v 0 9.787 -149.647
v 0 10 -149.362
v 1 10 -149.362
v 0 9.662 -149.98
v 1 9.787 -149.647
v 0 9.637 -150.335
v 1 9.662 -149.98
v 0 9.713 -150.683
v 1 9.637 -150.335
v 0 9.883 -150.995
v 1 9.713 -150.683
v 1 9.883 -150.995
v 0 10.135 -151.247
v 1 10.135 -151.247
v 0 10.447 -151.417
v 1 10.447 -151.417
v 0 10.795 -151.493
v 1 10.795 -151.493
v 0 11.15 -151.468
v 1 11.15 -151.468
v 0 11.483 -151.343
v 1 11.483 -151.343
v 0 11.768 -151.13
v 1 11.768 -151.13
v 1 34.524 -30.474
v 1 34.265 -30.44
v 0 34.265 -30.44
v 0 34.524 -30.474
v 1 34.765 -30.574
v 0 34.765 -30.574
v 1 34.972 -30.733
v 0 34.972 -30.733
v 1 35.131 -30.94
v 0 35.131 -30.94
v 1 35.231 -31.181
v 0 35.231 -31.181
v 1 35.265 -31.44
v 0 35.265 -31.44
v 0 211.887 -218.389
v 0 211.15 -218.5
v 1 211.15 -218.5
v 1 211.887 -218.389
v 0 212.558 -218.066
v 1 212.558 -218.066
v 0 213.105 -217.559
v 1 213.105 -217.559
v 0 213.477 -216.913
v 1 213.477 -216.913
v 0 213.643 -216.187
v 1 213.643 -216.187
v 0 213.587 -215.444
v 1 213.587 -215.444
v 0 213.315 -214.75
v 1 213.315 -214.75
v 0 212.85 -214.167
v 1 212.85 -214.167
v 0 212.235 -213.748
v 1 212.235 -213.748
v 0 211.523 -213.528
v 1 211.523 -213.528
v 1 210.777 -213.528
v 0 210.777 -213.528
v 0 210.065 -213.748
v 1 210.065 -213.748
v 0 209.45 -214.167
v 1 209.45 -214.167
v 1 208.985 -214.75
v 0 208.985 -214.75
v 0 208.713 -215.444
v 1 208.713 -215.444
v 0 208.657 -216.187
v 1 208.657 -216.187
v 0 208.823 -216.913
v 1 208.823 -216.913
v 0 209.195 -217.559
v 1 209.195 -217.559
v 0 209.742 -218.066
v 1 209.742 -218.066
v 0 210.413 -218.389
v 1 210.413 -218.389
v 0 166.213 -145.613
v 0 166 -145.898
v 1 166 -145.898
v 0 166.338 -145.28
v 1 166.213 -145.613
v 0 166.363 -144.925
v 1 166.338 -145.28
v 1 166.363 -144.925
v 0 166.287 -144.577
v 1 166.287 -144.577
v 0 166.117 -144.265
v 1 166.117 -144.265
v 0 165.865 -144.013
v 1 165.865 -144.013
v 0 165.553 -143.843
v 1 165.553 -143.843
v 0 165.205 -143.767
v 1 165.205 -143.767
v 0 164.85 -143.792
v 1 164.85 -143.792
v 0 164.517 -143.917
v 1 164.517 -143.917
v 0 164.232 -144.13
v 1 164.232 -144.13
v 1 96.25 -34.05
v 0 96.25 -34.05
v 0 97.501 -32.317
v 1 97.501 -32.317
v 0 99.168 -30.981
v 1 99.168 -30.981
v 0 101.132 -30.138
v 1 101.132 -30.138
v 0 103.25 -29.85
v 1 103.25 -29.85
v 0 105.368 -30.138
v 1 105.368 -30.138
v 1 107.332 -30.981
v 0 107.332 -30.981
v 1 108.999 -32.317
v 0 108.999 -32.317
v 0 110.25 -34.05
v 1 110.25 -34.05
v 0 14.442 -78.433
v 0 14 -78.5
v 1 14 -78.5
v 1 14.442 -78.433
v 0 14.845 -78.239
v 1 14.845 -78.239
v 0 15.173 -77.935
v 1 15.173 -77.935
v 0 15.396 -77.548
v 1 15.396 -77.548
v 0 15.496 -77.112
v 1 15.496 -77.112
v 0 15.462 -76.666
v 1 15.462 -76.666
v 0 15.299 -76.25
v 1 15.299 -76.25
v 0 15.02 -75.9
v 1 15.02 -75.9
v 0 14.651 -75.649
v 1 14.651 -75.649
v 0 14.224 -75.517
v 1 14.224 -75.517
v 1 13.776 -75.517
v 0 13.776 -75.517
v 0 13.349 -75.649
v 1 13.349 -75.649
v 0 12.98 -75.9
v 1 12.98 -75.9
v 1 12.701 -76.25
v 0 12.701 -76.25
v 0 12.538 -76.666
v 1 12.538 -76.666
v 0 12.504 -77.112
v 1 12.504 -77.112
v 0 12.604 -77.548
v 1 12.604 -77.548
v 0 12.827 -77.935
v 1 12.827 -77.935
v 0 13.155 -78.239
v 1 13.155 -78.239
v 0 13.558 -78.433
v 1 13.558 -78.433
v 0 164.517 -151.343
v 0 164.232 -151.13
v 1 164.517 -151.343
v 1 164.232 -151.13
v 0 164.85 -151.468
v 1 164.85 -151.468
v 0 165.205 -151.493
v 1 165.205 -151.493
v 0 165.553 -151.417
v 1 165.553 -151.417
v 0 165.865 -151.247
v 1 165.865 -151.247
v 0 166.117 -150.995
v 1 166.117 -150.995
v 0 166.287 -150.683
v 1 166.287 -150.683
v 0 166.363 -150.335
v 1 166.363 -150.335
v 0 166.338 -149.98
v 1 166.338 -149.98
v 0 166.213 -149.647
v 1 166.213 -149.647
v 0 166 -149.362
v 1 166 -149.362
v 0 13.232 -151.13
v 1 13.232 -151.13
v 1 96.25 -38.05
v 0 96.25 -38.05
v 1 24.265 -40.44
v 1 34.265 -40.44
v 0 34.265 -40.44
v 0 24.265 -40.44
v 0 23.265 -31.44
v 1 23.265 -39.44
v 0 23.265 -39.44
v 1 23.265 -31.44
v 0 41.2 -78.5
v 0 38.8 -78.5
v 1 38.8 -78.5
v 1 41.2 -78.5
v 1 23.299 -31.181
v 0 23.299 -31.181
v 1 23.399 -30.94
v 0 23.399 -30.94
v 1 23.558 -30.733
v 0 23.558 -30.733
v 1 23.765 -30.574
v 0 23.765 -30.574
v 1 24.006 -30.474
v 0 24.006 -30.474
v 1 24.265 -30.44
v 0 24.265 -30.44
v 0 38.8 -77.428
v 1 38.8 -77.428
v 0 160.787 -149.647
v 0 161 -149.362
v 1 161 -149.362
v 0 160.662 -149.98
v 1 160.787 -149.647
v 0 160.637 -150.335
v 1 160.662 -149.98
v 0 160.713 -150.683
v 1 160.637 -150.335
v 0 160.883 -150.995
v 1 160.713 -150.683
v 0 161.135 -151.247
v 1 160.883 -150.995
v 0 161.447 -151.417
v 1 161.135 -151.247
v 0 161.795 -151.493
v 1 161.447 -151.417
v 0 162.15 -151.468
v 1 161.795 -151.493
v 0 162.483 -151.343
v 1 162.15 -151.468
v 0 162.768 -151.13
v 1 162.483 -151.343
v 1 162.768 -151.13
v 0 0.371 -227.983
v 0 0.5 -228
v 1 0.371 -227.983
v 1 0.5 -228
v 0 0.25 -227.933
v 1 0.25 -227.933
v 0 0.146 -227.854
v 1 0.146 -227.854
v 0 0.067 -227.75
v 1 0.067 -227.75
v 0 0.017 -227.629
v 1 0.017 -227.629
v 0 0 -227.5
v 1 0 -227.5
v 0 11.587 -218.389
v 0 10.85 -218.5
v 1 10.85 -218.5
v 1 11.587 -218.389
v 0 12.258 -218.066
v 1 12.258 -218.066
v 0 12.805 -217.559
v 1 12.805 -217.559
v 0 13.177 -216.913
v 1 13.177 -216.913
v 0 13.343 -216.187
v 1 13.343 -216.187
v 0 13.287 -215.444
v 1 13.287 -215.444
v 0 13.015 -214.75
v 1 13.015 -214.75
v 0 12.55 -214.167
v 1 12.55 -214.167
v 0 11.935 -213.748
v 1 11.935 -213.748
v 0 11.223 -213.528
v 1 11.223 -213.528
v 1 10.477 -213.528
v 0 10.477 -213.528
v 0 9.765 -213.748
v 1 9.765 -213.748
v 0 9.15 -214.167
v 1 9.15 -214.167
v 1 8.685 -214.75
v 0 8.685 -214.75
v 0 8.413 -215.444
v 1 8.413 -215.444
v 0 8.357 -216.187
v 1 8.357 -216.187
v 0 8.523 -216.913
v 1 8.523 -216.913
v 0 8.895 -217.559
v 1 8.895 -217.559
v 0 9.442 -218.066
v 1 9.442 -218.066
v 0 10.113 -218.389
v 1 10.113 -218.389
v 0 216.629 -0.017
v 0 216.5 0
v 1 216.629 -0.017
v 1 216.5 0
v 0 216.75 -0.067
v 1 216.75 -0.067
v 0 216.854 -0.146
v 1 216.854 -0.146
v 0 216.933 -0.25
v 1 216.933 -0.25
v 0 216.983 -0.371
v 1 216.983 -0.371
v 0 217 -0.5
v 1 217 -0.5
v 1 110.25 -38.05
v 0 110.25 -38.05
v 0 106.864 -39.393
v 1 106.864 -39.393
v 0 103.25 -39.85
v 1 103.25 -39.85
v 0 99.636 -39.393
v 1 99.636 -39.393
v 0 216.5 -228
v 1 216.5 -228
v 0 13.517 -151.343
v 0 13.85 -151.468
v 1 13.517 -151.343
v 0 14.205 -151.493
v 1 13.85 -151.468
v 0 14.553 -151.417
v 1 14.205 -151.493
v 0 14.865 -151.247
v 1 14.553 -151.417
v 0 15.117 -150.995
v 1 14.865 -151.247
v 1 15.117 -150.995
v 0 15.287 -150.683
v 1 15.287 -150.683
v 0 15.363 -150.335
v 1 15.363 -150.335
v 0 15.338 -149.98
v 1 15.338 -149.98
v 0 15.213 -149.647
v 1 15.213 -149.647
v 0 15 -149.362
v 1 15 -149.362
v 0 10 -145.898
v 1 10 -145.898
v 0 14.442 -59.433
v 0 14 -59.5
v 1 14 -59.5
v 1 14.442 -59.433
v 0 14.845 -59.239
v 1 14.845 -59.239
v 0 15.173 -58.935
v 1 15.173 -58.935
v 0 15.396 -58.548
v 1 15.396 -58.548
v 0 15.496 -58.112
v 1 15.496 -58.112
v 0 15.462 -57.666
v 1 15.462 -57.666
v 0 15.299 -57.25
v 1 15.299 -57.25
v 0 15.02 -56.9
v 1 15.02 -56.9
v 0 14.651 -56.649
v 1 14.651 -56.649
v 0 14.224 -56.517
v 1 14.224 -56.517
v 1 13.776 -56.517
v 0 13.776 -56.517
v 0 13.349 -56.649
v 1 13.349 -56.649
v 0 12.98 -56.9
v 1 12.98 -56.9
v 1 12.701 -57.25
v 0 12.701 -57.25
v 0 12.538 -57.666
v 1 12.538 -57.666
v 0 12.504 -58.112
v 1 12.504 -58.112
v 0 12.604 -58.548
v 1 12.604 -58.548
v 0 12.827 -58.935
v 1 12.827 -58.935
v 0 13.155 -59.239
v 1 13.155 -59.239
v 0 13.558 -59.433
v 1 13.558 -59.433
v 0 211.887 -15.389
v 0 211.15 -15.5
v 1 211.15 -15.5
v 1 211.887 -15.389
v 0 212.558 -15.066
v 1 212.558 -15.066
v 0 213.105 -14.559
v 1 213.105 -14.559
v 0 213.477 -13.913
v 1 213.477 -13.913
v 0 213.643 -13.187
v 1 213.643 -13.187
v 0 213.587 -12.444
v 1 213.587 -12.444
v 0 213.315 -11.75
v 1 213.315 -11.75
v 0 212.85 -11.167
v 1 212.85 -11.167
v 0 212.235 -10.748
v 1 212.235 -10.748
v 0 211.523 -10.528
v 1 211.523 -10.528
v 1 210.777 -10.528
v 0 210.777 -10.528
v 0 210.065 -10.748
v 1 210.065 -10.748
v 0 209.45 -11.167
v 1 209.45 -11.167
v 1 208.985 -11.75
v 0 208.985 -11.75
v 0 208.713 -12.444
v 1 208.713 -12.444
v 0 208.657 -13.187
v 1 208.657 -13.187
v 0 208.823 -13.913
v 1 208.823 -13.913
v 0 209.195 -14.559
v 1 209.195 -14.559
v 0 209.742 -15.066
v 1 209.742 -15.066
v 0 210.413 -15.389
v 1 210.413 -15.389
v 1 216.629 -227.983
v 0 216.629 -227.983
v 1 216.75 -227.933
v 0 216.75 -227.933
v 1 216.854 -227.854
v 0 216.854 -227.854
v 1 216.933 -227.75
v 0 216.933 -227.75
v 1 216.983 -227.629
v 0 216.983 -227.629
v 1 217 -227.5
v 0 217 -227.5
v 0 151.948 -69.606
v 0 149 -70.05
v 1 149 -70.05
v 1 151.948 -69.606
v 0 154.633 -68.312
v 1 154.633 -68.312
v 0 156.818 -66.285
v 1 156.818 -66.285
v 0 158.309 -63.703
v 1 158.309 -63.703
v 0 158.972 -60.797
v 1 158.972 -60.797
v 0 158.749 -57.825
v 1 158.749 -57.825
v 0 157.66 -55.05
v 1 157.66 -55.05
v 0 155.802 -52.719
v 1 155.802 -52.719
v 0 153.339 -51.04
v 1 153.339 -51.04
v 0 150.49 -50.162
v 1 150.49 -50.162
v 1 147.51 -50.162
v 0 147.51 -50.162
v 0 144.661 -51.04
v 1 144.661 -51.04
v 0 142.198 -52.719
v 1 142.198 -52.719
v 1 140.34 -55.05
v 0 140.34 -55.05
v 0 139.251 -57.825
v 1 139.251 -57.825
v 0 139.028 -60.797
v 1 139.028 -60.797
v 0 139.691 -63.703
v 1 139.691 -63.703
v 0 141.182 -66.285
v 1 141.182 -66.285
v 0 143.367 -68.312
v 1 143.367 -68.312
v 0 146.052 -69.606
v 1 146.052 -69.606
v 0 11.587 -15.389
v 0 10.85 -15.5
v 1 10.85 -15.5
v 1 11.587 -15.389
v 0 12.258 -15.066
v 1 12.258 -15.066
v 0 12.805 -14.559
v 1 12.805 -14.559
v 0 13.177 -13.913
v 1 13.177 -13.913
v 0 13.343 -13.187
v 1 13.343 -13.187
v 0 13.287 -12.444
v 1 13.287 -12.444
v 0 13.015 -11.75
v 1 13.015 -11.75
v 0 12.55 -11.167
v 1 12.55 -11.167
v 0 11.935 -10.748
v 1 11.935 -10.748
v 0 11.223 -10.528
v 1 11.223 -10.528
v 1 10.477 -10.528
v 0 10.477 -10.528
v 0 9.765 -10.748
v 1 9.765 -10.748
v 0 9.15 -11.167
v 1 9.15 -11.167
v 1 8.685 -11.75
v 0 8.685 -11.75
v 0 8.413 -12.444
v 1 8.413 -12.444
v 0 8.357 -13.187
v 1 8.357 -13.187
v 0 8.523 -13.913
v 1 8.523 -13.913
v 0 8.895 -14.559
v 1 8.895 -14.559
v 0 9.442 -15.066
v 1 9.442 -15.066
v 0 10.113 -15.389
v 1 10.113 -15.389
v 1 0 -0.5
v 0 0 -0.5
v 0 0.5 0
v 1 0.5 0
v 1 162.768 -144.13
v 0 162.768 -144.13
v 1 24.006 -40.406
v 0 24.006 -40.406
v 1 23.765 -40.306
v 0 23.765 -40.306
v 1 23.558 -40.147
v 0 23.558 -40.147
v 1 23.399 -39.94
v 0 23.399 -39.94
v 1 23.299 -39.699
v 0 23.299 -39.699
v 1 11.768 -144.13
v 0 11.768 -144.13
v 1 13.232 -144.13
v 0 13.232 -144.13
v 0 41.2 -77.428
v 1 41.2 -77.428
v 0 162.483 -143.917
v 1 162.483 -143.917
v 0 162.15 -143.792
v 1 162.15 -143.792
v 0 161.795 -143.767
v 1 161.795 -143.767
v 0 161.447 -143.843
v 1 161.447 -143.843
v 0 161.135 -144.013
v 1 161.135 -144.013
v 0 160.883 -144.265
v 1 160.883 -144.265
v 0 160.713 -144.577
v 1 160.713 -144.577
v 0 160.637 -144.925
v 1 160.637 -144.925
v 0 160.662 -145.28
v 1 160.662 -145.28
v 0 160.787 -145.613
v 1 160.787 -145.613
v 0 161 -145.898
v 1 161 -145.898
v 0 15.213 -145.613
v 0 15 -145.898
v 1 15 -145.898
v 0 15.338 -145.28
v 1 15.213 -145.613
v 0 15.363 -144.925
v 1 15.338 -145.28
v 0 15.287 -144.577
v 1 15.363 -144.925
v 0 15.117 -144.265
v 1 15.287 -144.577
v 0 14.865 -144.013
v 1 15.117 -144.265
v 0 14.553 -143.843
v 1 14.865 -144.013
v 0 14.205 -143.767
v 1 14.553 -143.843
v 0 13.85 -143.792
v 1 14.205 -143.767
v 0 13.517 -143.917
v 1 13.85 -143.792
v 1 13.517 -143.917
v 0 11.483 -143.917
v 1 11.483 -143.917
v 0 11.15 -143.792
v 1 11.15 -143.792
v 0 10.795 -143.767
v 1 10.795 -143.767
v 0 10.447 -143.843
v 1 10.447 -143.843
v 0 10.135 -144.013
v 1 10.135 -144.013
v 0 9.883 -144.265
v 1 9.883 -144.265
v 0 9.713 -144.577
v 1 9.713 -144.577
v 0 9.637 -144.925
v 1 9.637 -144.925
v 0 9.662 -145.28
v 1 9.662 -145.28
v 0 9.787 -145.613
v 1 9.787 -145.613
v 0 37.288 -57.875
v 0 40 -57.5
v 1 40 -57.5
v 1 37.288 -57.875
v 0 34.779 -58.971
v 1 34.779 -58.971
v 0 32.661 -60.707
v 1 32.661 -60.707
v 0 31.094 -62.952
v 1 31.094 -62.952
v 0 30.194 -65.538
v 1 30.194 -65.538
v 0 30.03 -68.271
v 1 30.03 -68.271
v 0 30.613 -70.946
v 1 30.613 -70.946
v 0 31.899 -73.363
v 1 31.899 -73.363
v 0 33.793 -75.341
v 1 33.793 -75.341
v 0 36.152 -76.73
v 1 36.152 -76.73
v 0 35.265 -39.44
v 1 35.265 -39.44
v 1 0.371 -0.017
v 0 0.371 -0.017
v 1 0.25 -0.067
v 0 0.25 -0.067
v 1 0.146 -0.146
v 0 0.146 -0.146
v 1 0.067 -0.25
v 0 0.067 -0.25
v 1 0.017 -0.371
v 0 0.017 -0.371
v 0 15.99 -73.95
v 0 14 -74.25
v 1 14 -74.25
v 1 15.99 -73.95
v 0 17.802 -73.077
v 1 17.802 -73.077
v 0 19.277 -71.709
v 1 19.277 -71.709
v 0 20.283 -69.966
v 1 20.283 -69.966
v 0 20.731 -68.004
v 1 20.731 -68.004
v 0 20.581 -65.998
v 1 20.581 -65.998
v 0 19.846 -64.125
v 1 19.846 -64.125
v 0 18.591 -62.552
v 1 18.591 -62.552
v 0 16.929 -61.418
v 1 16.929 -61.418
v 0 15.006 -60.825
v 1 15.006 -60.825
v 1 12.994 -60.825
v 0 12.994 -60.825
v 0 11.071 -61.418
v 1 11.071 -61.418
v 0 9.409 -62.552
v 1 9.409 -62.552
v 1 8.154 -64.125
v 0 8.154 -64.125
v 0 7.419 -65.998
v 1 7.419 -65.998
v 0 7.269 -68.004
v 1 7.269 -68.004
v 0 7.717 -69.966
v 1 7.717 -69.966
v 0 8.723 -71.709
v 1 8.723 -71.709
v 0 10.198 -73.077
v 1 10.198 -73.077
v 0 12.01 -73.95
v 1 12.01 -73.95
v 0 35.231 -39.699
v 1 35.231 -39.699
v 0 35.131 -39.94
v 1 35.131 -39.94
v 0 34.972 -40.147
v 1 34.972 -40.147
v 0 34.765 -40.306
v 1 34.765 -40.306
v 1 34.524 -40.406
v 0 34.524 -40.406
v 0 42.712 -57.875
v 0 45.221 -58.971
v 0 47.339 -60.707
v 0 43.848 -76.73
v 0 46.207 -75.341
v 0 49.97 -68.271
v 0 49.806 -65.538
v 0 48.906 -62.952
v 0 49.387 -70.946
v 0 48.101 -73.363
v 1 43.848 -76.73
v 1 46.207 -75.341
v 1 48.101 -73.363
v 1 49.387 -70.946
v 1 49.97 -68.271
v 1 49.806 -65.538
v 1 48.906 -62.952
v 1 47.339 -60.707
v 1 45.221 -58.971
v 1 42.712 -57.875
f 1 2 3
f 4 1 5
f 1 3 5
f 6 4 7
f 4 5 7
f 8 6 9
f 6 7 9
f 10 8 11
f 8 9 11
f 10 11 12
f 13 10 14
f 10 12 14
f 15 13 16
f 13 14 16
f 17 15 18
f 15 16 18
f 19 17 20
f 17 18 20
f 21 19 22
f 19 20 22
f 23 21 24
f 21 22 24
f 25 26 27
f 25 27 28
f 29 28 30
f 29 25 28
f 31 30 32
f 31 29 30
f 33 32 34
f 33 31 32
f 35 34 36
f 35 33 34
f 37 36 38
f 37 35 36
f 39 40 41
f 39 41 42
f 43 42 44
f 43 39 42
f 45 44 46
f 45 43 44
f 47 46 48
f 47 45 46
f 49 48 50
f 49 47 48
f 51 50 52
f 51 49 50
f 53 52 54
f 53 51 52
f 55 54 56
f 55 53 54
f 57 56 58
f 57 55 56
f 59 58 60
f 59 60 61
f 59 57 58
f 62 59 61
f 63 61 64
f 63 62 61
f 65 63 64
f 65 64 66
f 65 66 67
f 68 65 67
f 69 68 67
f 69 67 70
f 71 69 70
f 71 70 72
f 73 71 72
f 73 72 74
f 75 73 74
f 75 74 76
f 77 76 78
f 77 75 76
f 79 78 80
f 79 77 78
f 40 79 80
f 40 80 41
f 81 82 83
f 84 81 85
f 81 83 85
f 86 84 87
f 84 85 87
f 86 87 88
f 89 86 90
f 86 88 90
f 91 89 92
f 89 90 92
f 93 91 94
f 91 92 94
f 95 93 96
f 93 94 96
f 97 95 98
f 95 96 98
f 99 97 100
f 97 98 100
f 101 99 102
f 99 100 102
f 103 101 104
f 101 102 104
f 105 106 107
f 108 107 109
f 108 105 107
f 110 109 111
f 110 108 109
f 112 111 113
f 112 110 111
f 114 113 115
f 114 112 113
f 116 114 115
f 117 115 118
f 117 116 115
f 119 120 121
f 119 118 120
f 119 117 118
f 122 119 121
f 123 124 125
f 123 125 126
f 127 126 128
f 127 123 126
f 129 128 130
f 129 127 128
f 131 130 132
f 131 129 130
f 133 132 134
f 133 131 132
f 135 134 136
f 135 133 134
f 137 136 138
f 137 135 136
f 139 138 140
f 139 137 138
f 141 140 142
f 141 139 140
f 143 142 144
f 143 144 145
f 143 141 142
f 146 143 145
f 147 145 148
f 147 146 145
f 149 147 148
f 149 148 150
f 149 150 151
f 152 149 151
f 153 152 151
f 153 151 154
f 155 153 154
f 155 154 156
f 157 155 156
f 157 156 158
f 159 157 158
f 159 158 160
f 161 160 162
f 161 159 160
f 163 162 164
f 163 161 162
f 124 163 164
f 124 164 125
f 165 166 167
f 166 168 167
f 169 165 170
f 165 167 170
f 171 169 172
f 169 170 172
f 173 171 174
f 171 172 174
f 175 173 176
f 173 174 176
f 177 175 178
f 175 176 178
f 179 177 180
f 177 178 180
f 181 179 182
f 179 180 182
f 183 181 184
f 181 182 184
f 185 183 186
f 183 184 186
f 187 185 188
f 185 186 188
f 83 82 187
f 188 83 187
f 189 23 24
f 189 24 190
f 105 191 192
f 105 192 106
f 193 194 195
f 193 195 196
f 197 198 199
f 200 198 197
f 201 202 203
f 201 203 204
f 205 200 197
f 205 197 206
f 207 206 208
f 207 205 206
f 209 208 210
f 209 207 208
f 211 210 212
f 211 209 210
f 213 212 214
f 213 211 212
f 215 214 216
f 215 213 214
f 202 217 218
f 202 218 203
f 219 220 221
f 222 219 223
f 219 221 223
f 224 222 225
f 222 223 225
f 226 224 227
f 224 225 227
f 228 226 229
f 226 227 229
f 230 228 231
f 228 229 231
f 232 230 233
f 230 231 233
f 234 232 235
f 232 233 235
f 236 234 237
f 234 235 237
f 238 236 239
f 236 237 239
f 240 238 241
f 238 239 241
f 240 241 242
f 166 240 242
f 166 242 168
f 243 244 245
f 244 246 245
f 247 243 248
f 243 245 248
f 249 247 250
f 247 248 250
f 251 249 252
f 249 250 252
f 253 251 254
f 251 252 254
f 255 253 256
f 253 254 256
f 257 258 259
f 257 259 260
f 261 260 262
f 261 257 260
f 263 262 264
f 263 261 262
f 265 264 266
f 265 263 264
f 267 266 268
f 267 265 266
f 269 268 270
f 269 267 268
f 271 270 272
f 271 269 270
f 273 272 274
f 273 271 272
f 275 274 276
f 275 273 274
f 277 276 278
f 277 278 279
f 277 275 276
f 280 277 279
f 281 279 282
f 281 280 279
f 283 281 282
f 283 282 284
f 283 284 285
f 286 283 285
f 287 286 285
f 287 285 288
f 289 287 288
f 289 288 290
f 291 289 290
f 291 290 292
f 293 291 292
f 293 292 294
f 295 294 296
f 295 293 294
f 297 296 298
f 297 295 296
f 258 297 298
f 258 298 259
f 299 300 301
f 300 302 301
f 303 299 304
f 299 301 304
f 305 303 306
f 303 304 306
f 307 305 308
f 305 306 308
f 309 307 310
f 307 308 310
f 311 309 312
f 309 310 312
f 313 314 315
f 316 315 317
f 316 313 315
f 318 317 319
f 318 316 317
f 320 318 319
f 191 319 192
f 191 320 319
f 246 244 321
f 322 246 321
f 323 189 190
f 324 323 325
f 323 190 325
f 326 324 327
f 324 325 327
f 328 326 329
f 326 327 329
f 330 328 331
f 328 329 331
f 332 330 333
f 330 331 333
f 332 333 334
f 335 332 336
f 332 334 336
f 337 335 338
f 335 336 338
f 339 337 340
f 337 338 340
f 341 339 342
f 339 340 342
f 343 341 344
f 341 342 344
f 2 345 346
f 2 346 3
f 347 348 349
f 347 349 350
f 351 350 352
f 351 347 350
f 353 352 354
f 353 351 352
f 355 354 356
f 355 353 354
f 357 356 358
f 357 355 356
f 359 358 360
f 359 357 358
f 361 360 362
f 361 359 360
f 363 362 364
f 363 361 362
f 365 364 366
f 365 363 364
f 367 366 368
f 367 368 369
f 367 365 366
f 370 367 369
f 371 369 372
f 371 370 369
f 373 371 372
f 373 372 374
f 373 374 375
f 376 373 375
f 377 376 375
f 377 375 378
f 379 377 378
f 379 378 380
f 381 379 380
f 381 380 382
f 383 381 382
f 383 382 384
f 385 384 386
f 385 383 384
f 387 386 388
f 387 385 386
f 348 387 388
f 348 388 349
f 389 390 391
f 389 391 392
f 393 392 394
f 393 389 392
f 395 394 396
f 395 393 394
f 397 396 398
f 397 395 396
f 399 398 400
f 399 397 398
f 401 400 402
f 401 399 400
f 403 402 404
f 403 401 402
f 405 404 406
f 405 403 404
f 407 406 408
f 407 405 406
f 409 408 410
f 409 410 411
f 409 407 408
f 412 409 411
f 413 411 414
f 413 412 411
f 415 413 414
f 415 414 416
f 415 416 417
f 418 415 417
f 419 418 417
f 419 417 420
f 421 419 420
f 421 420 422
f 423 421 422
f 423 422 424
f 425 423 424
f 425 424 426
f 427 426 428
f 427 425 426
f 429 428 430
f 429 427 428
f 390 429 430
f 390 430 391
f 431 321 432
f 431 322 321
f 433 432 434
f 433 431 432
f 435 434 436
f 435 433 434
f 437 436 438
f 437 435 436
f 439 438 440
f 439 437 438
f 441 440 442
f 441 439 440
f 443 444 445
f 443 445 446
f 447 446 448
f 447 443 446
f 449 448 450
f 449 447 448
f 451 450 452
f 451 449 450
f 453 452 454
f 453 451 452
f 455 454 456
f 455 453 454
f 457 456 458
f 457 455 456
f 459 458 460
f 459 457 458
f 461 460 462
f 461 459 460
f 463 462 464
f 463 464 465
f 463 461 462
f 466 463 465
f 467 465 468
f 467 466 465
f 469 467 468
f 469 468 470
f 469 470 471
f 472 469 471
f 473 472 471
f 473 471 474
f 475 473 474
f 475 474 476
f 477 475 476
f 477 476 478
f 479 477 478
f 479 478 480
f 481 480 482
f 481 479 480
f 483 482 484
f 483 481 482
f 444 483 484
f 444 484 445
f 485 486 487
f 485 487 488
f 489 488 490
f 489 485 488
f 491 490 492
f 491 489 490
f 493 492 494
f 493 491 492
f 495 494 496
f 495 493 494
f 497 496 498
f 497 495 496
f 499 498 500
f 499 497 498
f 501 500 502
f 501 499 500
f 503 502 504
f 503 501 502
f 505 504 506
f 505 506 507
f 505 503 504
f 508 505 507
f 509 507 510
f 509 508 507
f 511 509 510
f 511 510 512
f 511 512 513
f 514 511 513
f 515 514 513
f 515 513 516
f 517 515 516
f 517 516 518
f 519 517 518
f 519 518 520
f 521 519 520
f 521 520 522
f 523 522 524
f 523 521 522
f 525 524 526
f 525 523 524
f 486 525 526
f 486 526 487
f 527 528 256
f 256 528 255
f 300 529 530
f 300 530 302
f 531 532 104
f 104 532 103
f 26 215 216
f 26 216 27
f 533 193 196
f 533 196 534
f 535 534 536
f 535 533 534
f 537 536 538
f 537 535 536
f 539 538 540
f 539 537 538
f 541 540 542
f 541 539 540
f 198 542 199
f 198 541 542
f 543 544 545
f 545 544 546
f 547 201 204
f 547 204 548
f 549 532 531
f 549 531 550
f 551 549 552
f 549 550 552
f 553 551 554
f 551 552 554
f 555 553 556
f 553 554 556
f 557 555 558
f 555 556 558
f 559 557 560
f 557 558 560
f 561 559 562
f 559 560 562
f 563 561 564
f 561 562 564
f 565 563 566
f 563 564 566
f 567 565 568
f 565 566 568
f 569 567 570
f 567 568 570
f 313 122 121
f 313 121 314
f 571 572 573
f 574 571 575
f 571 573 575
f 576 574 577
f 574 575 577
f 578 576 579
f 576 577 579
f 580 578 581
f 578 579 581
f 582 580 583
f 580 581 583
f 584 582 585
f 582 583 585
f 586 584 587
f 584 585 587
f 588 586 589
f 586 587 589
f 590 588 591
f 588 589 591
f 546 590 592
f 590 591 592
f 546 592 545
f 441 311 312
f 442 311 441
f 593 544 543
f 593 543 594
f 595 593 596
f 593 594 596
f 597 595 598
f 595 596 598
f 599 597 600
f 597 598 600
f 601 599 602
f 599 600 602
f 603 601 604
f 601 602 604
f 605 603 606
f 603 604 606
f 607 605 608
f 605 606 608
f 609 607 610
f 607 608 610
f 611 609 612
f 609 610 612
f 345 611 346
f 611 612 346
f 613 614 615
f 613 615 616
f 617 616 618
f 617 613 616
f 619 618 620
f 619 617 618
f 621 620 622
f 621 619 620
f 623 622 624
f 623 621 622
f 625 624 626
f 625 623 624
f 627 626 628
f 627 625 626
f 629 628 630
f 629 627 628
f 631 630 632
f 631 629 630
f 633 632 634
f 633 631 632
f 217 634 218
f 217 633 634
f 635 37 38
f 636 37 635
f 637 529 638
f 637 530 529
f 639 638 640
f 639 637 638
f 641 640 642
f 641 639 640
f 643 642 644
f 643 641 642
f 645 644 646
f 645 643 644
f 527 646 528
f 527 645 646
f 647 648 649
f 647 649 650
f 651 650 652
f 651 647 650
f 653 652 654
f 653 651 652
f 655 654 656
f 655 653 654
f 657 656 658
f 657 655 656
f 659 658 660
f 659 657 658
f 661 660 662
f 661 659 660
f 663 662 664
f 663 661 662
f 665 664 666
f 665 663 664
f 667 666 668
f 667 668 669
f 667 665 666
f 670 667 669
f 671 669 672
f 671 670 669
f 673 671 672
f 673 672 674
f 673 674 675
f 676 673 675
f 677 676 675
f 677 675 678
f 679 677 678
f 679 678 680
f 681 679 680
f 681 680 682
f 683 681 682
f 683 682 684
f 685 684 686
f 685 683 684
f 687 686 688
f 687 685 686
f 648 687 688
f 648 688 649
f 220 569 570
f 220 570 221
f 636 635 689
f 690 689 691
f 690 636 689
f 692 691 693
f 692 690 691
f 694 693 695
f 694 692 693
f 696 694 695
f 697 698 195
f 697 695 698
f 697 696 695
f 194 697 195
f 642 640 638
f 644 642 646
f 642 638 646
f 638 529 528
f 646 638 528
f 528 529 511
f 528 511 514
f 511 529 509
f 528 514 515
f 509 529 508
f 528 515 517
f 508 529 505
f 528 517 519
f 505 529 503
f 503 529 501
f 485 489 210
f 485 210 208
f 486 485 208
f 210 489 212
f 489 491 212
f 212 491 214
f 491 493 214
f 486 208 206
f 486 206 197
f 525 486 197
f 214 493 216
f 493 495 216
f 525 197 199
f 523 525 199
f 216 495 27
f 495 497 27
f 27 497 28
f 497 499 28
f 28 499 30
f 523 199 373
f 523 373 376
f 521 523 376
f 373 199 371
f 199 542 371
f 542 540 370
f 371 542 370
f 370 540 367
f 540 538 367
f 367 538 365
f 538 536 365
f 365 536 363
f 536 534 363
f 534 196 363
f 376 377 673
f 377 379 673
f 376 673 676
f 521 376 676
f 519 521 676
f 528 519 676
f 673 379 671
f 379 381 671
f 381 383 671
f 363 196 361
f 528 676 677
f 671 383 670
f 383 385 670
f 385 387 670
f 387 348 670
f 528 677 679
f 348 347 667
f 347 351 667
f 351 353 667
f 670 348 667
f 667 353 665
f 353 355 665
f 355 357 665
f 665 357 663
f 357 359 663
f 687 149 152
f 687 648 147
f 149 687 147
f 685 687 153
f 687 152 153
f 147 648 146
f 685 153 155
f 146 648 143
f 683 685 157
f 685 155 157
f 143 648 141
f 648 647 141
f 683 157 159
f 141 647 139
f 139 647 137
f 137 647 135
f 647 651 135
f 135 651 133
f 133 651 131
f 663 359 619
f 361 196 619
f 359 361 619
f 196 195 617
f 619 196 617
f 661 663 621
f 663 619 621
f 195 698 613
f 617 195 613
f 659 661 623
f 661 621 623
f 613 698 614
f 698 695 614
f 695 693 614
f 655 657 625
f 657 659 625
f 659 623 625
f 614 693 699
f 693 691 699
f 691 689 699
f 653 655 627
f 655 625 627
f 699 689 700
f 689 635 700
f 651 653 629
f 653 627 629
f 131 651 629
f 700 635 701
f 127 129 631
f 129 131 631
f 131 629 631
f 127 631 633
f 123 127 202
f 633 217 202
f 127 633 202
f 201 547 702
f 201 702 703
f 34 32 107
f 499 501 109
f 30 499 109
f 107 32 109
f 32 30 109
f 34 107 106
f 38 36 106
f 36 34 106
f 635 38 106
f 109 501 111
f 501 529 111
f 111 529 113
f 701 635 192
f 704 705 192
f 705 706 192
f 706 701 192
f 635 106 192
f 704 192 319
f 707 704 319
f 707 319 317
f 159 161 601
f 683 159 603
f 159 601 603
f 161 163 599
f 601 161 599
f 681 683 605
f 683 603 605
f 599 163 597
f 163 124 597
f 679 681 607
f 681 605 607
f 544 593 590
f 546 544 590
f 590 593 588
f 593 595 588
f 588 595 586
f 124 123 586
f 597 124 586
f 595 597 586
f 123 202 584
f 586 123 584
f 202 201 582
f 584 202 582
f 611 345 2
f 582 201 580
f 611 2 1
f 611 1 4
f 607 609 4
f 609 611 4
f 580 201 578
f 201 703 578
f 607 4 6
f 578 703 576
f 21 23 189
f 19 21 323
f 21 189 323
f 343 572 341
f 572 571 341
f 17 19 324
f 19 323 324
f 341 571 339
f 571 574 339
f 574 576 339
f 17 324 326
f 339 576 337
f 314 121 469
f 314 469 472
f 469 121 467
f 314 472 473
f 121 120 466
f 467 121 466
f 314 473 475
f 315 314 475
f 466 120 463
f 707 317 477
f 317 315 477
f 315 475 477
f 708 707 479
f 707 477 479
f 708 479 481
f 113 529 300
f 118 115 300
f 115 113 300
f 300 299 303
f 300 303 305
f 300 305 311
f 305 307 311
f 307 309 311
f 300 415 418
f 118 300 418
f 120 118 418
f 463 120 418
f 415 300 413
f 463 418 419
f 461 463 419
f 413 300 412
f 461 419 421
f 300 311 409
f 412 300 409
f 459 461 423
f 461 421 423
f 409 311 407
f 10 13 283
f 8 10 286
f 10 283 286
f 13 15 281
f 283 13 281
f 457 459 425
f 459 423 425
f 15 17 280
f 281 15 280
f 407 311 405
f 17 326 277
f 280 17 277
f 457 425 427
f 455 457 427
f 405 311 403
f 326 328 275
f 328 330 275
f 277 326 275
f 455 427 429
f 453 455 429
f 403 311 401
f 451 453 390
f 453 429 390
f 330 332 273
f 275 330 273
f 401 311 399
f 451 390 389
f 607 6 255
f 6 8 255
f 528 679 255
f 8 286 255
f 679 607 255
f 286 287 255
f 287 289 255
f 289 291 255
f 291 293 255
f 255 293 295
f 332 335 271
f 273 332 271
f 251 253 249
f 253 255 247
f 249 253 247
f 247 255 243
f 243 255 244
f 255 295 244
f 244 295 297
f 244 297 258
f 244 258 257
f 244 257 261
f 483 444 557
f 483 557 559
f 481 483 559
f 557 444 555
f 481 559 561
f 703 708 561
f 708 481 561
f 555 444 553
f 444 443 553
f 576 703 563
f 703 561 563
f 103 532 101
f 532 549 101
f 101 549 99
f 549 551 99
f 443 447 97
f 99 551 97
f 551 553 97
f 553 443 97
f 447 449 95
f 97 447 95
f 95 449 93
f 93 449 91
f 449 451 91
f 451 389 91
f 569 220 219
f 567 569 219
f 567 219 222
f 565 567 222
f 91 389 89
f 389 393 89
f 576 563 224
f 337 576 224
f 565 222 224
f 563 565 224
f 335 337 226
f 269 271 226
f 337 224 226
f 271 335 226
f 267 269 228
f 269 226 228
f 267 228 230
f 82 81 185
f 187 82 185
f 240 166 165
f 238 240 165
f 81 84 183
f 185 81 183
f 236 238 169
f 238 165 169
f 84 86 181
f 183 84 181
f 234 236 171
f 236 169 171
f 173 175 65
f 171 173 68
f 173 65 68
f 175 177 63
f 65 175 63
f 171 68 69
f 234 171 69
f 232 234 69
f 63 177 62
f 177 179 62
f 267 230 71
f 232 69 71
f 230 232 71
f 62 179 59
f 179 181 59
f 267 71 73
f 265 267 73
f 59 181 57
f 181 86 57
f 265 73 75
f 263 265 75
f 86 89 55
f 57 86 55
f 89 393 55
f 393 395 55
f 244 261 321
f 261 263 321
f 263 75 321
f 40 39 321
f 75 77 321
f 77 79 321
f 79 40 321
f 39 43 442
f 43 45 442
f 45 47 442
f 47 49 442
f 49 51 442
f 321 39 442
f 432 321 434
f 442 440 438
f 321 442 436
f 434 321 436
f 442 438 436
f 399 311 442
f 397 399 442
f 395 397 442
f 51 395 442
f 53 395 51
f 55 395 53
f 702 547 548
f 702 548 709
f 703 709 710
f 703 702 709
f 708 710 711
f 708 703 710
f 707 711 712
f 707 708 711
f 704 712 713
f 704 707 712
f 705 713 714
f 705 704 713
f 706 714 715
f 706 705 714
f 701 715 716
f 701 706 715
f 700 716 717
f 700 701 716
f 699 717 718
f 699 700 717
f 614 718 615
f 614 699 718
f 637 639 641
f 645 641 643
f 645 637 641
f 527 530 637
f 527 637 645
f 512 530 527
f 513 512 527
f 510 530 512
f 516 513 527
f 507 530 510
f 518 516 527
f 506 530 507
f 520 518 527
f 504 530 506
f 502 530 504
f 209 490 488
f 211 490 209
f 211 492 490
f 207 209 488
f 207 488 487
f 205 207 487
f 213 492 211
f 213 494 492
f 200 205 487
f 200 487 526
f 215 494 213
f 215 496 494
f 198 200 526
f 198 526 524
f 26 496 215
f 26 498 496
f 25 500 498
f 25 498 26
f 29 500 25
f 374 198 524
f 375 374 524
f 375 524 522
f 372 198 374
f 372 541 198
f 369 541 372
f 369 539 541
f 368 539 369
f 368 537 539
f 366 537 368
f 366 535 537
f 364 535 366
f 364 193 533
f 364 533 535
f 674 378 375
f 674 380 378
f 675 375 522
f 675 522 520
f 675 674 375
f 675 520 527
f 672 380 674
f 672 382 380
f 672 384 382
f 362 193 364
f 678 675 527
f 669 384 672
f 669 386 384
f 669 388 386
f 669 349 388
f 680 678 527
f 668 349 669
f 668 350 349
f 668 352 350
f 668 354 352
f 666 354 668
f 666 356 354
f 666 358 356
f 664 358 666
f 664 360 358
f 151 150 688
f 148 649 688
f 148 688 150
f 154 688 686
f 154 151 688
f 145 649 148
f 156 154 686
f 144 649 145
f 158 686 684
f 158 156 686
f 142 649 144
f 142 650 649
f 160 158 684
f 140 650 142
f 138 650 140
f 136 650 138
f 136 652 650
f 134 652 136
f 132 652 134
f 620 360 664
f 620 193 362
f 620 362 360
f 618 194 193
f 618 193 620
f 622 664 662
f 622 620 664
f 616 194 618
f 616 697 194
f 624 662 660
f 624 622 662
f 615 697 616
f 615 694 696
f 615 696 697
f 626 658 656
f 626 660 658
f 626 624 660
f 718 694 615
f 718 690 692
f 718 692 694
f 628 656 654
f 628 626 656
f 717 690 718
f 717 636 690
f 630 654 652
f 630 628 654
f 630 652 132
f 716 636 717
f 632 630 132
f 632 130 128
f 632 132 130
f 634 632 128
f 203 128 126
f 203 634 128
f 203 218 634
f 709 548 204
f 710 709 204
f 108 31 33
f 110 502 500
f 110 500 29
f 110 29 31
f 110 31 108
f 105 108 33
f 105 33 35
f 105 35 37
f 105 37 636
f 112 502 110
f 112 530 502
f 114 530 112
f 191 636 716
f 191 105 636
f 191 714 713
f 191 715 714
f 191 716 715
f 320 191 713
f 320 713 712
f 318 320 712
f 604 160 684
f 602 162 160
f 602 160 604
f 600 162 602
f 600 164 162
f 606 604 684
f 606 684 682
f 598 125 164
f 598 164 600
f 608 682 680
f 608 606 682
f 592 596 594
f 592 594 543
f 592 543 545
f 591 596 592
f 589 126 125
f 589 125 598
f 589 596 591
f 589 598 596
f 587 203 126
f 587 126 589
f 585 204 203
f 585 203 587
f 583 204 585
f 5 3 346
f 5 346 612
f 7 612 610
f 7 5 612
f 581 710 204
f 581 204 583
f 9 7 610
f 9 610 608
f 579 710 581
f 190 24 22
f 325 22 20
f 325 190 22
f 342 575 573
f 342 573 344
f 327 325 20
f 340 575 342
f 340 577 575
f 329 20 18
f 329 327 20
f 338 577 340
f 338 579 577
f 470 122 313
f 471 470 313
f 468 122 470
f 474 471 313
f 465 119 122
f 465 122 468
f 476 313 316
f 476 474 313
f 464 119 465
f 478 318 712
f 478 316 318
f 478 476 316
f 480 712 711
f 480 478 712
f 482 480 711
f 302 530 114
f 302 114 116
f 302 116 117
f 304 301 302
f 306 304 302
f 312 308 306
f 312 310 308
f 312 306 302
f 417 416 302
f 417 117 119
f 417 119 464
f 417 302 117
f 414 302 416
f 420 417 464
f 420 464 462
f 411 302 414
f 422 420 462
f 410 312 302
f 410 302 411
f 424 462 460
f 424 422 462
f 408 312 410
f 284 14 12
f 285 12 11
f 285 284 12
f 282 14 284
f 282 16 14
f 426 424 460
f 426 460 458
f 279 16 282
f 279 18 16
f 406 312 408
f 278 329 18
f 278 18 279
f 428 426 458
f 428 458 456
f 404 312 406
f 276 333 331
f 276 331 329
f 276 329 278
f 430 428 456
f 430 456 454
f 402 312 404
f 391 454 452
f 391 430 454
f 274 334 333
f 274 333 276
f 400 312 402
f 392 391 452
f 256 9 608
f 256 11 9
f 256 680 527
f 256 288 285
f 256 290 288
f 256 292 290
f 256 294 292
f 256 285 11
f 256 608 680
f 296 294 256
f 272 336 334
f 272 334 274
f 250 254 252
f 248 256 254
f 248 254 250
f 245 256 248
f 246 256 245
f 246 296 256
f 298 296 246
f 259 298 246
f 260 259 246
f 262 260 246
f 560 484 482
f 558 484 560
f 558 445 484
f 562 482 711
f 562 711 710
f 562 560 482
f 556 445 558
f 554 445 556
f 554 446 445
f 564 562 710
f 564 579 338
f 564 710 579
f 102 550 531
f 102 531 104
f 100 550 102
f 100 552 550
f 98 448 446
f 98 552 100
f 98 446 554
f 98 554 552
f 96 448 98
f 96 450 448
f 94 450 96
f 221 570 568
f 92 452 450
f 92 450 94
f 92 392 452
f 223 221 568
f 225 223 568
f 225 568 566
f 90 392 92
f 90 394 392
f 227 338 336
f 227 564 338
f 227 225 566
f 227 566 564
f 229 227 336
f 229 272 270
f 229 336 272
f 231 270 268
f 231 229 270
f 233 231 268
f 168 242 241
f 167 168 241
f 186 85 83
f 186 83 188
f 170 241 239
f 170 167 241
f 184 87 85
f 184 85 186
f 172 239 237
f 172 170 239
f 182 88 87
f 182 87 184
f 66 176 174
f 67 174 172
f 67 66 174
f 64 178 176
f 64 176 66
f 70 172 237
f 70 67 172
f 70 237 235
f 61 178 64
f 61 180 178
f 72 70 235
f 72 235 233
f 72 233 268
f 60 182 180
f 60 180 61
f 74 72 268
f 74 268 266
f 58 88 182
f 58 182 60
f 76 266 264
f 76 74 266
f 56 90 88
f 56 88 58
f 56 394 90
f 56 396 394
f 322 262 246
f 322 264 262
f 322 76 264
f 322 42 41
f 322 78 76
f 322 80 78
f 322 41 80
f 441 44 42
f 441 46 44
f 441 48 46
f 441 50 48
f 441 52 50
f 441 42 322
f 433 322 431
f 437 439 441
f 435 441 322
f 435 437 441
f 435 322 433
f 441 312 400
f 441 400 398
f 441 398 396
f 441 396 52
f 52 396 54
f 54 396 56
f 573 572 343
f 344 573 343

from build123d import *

# Parameters (mm, degrees)
SKETCH1_W           = 228
SKETCH1_H           = 217
SKETCH1_R           = 2.5
SKETCH1_R_2         = 6.75
SKETCH1_R_3         = 10
SKETCH1_R_4         = 1.5
SKETCH1_W_2         = 7
SKETCH1_H_2         = 5
BOSS_EXTRUDE1_DEPTH = 1
SKETCH5_R           = 1.25
CUT_EXTRUDE3_DEPTH  = 315.760226204
FILLET1_R           = 0.5


with BuildPart() as part:
    # Sketch1 → Boss-Extrude1 (new body)
    with BuildSketch(Plane(origin=(0, 0, 0), x_dir=(0, 0, -1), z_dir=(1, 0, 0))):
        with Locations((114, 108.5)):
            Rectangle(SKETCH1_W, SKETCH1_H)
        with Locations((13, 10.85)):
            Circle(SKETCH1_R, mode=Mode.SUBTRACT)
        with Locations((13, 211.15)):
            Circle(SKETCH1_R, mode=Mode.SUBTRACT)
        with Locations((67.5, 14)):
            Circle(SKETCH1_R_2, mode=Mode.SUBTRACT)
        with Locations((216, 10.85)):
            Circle(SKETCH1_R, mode=Mode.SUBTRACT)
        with Locations((216, 211.15)):
            Circle(SKETCH1_R, mode=Mode.SUBTRACT)
        with Locations((60.05, 149)):
            Circle(SKETCH1_R_3, mode=Mode.SUBTRACT)
        with Locations((77, 14)):
            Circle(SKETCH1_R_4, mode=Mode.SUBTRACT)
        with Locations((58, 14)):
            Circle(SKETCH1_R_4, mode=Mode.SUBTRACT)
        with Locations((147.63, 12.5)):
            Rectangle(SKETCH1_W_2, SKETCH1_H_2, mode=Mode.SUBTRACT)
        with Locations((147.63, 163.5)):
            Rectangle(SKETCH1_W_2, SKETCH1_H_2, mode=Mode.SUBTRACT)
        with BuildLine():
            Line((78.5, 41.2), (77.427738917, 41.2))
            ThreePointArc((77.427738917, 41.2), (66.898913138, 49.981918382), (57.5, 40))
            ThreePointArc((57.5, 40), (66.898913138, 30.018081618), (77.427738917, 38.8))
            Line((77.427738917, 38.8), (78.5, 38.8))
            Line((78.5, 38.8), (78.5, 41.2))
        make_face(mode=Mode.SUBTRACT)
    extrude(amount=BOSS_EXTRUDE1_DEPTH)

    # Sketch5 → Cut-Extrude3 (cut, through all)
    with BuildSketch(Plane(origin=(1, 0, 0), x_dir=(0, 0, -1), z_dir=(1, 0, 0))):
        with Locations((145.013883476, 165.116116524)):
            Circle(SKETCH5_R)
        with Locations((150.246116524, 165.116116524)):
            Circle(SKETCH5_R)
        with Locations((145.013883476, 161.883883476)):
            Circle(SKETCH5_R)
        with Locations((150.246116524, 161.883883476)):
            Circle(SKETCH5_R)
        with Locations((150.246116524, 14.116116524)):
            Circle(SKETCH5_R)
        with Locations((150.246116524, 10.883883476)):
            Circle(SKETCH5_R)
        with Locations((145.013883476, 10.883883476)):
            Circle(SKETCH5_R)
        with Locations((145.013883476, 14.116116524)):
            Circle(SKETCH5_R)
        with BuildLine():
            Line((34.05, 110.25), (38.05, 110.25))
            ThreePointArc((38.05, 110.25), (39.85, 103.25), (38.05, 96.25))
            Line((38.05, 96.25), (34.05, 96.25))
            ThreePointArc((34.05, 96.25), (29.85, 103.25), (34.05, 110.25))
        make_face()
        with BuildLine():
            Line((31.44, 35.265), (39.44, 35.265))
            ThreePointArc((39.44, 35.265), (40.147106781, 34.972106781), (40.44, 34.265))
            Line((40.44, 34.265), (40.44, 24.265))
            ThreePointArc((40.44, 24.265), (40.147106781, 23.557893219), (39.44, 23.265))
            Line((39.44, 23.265), (31.44, 23.265))
            ThreePointArc((31.44, 23.265), (30.732893219, 23.557893219), (30.44, 24.265))
            Line((30.44, 24.265), (30.44, 34.265))
            ThreePointArc((30.44, 34.265), (30.732893219, 34.972106781), (31.44, 35.265))
        make_face()
    extrude(amount=-CUT_EXTRUDE3_DEPTH, mode=Mode.SUBTRACT)

    # Fillet1
    fillet1_edges = [part.edges().sort_by_distance(p)[0] for p in [
        (0.5, 0, -228),
        (0.5, 0, 0),
        (0.5, 217, 0),
        (0.5, 217, -228),
    ]]
    fillet(fillet1_edges, radius=FILLET1_R)


solid = part.part
